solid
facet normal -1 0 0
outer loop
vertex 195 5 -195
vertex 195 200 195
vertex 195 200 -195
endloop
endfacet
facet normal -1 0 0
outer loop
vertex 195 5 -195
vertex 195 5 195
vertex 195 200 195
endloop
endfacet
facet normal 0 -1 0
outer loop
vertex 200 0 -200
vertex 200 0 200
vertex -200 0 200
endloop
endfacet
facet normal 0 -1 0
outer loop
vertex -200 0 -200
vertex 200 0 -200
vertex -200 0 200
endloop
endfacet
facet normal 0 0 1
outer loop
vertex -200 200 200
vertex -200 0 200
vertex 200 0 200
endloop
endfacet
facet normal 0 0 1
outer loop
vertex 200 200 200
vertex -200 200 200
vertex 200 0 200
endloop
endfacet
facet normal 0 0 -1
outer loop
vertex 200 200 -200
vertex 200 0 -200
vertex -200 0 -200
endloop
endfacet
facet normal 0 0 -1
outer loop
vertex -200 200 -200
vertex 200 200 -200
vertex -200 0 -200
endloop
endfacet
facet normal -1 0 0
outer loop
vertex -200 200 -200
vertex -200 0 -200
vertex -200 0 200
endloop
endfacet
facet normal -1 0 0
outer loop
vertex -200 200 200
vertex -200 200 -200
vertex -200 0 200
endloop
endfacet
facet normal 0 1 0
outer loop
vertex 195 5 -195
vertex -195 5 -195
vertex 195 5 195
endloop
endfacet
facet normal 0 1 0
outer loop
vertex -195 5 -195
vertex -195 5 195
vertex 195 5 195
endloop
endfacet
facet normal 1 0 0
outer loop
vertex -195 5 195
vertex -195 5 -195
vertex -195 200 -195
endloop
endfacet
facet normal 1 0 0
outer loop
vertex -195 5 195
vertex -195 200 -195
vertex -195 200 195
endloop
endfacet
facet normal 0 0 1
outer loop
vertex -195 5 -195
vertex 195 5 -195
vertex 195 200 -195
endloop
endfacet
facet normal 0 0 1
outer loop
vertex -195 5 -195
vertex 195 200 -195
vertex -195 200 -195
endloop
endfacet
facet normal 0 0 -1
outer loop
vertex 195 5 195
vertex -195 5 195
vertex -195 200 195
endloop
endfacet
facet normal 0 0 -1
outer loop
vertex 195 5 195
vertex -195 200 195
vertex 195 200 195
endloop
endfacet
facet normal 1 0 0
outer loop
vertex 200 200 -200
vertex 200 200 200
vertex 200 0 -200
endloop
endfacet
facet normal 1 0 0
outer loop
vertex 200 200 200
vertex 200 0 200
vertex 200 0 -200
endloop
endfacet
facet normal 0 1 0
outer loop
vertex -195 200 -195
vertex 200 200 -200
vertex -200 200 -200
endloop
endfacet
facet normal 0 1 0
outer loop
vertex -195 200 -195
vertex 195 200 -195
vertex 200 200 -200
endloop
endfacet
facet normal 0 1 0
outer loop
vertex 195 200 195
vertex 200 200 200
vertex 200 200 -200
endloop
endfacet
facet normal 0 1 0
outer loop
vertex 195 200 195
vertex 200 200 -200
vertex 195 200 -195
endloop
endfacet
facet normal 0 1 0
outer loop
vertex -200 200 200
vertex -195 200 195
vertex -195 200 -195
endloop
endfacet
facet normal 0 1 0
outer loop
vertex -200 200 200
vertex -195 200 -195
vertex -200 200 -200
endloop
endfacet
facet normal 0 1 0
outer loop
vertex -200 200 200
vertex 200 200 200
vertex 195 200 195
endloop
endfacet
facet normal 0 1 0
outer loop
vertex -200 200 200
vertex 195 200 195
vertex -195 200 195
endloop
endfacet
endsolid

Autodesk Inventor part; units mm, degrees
ref_plane "YZ Plane" through (0, 0, 0) normal (1, 0, 0) x (0, 1, 0)
ref_plane "XZ Plane" through (0, 0, 0) normal (0, 1, 0) x (-1, 0, 0)
ref_plane "XY Plane" through (0, 0, 0) normal (0, 0, 1) x (1, 0, 0)
sketch "Boceto1" plane through (0, 0, 0) normal (0, 1, 0) x (-1, 0, 0)
  line L0 (200, 200) -> (-200, 200)
  line L1 (-200, 200) -> (-200, -200)
  line L2 (-200, -200) -> (200, -200)
  line L3 (200, -200) -> (200, 200)
  line L4 (195, 195) -> (-195, 195)
  line L5 (-195, 195) -> (-195, -195)
  line L6 (-195, -195) -> (195, -195)
  line L7 (195, -195) -> (195, 195)
  point P0 (0, 0)
  dimension "L" = 400
  dimension "d1" = 400
  dimension "d2" = 200
  dimension "d3" = 200
  dimension "d4" = 390
  dimension "d5" = 390
  dimension "d6" = 195
  dimension "d7" = 195
extrude "Extrusión1" add sketch "Boceto1" along normal blind 200
sketch "Boceto2" plane through (0, 0, 0) normal (0, -1, 0) x (1, 0, 0)
  line L0 (195, 195) -> (-195, 195) projected
  line L1 (-195, -195) -> (195, -195) projected
  line L2 (195, 195) -> (-195, 195)
  line L3 (-195, 195) -> (-195, -195)
  line L4 (-195, -195) -> (195, -195)
  line L5 (195, -195) -> (195, 195)
  point P0 (0, 0)
  point P1 (195, -195)
extrude "Extrusión2" add sketch "Boceto2" against normal blind 5
equation "\"d1\" = L"
equation "\"d2\" = 0.5 * L"
equation "\"d3\" = 0.5 * L"
properties part number "techo"
